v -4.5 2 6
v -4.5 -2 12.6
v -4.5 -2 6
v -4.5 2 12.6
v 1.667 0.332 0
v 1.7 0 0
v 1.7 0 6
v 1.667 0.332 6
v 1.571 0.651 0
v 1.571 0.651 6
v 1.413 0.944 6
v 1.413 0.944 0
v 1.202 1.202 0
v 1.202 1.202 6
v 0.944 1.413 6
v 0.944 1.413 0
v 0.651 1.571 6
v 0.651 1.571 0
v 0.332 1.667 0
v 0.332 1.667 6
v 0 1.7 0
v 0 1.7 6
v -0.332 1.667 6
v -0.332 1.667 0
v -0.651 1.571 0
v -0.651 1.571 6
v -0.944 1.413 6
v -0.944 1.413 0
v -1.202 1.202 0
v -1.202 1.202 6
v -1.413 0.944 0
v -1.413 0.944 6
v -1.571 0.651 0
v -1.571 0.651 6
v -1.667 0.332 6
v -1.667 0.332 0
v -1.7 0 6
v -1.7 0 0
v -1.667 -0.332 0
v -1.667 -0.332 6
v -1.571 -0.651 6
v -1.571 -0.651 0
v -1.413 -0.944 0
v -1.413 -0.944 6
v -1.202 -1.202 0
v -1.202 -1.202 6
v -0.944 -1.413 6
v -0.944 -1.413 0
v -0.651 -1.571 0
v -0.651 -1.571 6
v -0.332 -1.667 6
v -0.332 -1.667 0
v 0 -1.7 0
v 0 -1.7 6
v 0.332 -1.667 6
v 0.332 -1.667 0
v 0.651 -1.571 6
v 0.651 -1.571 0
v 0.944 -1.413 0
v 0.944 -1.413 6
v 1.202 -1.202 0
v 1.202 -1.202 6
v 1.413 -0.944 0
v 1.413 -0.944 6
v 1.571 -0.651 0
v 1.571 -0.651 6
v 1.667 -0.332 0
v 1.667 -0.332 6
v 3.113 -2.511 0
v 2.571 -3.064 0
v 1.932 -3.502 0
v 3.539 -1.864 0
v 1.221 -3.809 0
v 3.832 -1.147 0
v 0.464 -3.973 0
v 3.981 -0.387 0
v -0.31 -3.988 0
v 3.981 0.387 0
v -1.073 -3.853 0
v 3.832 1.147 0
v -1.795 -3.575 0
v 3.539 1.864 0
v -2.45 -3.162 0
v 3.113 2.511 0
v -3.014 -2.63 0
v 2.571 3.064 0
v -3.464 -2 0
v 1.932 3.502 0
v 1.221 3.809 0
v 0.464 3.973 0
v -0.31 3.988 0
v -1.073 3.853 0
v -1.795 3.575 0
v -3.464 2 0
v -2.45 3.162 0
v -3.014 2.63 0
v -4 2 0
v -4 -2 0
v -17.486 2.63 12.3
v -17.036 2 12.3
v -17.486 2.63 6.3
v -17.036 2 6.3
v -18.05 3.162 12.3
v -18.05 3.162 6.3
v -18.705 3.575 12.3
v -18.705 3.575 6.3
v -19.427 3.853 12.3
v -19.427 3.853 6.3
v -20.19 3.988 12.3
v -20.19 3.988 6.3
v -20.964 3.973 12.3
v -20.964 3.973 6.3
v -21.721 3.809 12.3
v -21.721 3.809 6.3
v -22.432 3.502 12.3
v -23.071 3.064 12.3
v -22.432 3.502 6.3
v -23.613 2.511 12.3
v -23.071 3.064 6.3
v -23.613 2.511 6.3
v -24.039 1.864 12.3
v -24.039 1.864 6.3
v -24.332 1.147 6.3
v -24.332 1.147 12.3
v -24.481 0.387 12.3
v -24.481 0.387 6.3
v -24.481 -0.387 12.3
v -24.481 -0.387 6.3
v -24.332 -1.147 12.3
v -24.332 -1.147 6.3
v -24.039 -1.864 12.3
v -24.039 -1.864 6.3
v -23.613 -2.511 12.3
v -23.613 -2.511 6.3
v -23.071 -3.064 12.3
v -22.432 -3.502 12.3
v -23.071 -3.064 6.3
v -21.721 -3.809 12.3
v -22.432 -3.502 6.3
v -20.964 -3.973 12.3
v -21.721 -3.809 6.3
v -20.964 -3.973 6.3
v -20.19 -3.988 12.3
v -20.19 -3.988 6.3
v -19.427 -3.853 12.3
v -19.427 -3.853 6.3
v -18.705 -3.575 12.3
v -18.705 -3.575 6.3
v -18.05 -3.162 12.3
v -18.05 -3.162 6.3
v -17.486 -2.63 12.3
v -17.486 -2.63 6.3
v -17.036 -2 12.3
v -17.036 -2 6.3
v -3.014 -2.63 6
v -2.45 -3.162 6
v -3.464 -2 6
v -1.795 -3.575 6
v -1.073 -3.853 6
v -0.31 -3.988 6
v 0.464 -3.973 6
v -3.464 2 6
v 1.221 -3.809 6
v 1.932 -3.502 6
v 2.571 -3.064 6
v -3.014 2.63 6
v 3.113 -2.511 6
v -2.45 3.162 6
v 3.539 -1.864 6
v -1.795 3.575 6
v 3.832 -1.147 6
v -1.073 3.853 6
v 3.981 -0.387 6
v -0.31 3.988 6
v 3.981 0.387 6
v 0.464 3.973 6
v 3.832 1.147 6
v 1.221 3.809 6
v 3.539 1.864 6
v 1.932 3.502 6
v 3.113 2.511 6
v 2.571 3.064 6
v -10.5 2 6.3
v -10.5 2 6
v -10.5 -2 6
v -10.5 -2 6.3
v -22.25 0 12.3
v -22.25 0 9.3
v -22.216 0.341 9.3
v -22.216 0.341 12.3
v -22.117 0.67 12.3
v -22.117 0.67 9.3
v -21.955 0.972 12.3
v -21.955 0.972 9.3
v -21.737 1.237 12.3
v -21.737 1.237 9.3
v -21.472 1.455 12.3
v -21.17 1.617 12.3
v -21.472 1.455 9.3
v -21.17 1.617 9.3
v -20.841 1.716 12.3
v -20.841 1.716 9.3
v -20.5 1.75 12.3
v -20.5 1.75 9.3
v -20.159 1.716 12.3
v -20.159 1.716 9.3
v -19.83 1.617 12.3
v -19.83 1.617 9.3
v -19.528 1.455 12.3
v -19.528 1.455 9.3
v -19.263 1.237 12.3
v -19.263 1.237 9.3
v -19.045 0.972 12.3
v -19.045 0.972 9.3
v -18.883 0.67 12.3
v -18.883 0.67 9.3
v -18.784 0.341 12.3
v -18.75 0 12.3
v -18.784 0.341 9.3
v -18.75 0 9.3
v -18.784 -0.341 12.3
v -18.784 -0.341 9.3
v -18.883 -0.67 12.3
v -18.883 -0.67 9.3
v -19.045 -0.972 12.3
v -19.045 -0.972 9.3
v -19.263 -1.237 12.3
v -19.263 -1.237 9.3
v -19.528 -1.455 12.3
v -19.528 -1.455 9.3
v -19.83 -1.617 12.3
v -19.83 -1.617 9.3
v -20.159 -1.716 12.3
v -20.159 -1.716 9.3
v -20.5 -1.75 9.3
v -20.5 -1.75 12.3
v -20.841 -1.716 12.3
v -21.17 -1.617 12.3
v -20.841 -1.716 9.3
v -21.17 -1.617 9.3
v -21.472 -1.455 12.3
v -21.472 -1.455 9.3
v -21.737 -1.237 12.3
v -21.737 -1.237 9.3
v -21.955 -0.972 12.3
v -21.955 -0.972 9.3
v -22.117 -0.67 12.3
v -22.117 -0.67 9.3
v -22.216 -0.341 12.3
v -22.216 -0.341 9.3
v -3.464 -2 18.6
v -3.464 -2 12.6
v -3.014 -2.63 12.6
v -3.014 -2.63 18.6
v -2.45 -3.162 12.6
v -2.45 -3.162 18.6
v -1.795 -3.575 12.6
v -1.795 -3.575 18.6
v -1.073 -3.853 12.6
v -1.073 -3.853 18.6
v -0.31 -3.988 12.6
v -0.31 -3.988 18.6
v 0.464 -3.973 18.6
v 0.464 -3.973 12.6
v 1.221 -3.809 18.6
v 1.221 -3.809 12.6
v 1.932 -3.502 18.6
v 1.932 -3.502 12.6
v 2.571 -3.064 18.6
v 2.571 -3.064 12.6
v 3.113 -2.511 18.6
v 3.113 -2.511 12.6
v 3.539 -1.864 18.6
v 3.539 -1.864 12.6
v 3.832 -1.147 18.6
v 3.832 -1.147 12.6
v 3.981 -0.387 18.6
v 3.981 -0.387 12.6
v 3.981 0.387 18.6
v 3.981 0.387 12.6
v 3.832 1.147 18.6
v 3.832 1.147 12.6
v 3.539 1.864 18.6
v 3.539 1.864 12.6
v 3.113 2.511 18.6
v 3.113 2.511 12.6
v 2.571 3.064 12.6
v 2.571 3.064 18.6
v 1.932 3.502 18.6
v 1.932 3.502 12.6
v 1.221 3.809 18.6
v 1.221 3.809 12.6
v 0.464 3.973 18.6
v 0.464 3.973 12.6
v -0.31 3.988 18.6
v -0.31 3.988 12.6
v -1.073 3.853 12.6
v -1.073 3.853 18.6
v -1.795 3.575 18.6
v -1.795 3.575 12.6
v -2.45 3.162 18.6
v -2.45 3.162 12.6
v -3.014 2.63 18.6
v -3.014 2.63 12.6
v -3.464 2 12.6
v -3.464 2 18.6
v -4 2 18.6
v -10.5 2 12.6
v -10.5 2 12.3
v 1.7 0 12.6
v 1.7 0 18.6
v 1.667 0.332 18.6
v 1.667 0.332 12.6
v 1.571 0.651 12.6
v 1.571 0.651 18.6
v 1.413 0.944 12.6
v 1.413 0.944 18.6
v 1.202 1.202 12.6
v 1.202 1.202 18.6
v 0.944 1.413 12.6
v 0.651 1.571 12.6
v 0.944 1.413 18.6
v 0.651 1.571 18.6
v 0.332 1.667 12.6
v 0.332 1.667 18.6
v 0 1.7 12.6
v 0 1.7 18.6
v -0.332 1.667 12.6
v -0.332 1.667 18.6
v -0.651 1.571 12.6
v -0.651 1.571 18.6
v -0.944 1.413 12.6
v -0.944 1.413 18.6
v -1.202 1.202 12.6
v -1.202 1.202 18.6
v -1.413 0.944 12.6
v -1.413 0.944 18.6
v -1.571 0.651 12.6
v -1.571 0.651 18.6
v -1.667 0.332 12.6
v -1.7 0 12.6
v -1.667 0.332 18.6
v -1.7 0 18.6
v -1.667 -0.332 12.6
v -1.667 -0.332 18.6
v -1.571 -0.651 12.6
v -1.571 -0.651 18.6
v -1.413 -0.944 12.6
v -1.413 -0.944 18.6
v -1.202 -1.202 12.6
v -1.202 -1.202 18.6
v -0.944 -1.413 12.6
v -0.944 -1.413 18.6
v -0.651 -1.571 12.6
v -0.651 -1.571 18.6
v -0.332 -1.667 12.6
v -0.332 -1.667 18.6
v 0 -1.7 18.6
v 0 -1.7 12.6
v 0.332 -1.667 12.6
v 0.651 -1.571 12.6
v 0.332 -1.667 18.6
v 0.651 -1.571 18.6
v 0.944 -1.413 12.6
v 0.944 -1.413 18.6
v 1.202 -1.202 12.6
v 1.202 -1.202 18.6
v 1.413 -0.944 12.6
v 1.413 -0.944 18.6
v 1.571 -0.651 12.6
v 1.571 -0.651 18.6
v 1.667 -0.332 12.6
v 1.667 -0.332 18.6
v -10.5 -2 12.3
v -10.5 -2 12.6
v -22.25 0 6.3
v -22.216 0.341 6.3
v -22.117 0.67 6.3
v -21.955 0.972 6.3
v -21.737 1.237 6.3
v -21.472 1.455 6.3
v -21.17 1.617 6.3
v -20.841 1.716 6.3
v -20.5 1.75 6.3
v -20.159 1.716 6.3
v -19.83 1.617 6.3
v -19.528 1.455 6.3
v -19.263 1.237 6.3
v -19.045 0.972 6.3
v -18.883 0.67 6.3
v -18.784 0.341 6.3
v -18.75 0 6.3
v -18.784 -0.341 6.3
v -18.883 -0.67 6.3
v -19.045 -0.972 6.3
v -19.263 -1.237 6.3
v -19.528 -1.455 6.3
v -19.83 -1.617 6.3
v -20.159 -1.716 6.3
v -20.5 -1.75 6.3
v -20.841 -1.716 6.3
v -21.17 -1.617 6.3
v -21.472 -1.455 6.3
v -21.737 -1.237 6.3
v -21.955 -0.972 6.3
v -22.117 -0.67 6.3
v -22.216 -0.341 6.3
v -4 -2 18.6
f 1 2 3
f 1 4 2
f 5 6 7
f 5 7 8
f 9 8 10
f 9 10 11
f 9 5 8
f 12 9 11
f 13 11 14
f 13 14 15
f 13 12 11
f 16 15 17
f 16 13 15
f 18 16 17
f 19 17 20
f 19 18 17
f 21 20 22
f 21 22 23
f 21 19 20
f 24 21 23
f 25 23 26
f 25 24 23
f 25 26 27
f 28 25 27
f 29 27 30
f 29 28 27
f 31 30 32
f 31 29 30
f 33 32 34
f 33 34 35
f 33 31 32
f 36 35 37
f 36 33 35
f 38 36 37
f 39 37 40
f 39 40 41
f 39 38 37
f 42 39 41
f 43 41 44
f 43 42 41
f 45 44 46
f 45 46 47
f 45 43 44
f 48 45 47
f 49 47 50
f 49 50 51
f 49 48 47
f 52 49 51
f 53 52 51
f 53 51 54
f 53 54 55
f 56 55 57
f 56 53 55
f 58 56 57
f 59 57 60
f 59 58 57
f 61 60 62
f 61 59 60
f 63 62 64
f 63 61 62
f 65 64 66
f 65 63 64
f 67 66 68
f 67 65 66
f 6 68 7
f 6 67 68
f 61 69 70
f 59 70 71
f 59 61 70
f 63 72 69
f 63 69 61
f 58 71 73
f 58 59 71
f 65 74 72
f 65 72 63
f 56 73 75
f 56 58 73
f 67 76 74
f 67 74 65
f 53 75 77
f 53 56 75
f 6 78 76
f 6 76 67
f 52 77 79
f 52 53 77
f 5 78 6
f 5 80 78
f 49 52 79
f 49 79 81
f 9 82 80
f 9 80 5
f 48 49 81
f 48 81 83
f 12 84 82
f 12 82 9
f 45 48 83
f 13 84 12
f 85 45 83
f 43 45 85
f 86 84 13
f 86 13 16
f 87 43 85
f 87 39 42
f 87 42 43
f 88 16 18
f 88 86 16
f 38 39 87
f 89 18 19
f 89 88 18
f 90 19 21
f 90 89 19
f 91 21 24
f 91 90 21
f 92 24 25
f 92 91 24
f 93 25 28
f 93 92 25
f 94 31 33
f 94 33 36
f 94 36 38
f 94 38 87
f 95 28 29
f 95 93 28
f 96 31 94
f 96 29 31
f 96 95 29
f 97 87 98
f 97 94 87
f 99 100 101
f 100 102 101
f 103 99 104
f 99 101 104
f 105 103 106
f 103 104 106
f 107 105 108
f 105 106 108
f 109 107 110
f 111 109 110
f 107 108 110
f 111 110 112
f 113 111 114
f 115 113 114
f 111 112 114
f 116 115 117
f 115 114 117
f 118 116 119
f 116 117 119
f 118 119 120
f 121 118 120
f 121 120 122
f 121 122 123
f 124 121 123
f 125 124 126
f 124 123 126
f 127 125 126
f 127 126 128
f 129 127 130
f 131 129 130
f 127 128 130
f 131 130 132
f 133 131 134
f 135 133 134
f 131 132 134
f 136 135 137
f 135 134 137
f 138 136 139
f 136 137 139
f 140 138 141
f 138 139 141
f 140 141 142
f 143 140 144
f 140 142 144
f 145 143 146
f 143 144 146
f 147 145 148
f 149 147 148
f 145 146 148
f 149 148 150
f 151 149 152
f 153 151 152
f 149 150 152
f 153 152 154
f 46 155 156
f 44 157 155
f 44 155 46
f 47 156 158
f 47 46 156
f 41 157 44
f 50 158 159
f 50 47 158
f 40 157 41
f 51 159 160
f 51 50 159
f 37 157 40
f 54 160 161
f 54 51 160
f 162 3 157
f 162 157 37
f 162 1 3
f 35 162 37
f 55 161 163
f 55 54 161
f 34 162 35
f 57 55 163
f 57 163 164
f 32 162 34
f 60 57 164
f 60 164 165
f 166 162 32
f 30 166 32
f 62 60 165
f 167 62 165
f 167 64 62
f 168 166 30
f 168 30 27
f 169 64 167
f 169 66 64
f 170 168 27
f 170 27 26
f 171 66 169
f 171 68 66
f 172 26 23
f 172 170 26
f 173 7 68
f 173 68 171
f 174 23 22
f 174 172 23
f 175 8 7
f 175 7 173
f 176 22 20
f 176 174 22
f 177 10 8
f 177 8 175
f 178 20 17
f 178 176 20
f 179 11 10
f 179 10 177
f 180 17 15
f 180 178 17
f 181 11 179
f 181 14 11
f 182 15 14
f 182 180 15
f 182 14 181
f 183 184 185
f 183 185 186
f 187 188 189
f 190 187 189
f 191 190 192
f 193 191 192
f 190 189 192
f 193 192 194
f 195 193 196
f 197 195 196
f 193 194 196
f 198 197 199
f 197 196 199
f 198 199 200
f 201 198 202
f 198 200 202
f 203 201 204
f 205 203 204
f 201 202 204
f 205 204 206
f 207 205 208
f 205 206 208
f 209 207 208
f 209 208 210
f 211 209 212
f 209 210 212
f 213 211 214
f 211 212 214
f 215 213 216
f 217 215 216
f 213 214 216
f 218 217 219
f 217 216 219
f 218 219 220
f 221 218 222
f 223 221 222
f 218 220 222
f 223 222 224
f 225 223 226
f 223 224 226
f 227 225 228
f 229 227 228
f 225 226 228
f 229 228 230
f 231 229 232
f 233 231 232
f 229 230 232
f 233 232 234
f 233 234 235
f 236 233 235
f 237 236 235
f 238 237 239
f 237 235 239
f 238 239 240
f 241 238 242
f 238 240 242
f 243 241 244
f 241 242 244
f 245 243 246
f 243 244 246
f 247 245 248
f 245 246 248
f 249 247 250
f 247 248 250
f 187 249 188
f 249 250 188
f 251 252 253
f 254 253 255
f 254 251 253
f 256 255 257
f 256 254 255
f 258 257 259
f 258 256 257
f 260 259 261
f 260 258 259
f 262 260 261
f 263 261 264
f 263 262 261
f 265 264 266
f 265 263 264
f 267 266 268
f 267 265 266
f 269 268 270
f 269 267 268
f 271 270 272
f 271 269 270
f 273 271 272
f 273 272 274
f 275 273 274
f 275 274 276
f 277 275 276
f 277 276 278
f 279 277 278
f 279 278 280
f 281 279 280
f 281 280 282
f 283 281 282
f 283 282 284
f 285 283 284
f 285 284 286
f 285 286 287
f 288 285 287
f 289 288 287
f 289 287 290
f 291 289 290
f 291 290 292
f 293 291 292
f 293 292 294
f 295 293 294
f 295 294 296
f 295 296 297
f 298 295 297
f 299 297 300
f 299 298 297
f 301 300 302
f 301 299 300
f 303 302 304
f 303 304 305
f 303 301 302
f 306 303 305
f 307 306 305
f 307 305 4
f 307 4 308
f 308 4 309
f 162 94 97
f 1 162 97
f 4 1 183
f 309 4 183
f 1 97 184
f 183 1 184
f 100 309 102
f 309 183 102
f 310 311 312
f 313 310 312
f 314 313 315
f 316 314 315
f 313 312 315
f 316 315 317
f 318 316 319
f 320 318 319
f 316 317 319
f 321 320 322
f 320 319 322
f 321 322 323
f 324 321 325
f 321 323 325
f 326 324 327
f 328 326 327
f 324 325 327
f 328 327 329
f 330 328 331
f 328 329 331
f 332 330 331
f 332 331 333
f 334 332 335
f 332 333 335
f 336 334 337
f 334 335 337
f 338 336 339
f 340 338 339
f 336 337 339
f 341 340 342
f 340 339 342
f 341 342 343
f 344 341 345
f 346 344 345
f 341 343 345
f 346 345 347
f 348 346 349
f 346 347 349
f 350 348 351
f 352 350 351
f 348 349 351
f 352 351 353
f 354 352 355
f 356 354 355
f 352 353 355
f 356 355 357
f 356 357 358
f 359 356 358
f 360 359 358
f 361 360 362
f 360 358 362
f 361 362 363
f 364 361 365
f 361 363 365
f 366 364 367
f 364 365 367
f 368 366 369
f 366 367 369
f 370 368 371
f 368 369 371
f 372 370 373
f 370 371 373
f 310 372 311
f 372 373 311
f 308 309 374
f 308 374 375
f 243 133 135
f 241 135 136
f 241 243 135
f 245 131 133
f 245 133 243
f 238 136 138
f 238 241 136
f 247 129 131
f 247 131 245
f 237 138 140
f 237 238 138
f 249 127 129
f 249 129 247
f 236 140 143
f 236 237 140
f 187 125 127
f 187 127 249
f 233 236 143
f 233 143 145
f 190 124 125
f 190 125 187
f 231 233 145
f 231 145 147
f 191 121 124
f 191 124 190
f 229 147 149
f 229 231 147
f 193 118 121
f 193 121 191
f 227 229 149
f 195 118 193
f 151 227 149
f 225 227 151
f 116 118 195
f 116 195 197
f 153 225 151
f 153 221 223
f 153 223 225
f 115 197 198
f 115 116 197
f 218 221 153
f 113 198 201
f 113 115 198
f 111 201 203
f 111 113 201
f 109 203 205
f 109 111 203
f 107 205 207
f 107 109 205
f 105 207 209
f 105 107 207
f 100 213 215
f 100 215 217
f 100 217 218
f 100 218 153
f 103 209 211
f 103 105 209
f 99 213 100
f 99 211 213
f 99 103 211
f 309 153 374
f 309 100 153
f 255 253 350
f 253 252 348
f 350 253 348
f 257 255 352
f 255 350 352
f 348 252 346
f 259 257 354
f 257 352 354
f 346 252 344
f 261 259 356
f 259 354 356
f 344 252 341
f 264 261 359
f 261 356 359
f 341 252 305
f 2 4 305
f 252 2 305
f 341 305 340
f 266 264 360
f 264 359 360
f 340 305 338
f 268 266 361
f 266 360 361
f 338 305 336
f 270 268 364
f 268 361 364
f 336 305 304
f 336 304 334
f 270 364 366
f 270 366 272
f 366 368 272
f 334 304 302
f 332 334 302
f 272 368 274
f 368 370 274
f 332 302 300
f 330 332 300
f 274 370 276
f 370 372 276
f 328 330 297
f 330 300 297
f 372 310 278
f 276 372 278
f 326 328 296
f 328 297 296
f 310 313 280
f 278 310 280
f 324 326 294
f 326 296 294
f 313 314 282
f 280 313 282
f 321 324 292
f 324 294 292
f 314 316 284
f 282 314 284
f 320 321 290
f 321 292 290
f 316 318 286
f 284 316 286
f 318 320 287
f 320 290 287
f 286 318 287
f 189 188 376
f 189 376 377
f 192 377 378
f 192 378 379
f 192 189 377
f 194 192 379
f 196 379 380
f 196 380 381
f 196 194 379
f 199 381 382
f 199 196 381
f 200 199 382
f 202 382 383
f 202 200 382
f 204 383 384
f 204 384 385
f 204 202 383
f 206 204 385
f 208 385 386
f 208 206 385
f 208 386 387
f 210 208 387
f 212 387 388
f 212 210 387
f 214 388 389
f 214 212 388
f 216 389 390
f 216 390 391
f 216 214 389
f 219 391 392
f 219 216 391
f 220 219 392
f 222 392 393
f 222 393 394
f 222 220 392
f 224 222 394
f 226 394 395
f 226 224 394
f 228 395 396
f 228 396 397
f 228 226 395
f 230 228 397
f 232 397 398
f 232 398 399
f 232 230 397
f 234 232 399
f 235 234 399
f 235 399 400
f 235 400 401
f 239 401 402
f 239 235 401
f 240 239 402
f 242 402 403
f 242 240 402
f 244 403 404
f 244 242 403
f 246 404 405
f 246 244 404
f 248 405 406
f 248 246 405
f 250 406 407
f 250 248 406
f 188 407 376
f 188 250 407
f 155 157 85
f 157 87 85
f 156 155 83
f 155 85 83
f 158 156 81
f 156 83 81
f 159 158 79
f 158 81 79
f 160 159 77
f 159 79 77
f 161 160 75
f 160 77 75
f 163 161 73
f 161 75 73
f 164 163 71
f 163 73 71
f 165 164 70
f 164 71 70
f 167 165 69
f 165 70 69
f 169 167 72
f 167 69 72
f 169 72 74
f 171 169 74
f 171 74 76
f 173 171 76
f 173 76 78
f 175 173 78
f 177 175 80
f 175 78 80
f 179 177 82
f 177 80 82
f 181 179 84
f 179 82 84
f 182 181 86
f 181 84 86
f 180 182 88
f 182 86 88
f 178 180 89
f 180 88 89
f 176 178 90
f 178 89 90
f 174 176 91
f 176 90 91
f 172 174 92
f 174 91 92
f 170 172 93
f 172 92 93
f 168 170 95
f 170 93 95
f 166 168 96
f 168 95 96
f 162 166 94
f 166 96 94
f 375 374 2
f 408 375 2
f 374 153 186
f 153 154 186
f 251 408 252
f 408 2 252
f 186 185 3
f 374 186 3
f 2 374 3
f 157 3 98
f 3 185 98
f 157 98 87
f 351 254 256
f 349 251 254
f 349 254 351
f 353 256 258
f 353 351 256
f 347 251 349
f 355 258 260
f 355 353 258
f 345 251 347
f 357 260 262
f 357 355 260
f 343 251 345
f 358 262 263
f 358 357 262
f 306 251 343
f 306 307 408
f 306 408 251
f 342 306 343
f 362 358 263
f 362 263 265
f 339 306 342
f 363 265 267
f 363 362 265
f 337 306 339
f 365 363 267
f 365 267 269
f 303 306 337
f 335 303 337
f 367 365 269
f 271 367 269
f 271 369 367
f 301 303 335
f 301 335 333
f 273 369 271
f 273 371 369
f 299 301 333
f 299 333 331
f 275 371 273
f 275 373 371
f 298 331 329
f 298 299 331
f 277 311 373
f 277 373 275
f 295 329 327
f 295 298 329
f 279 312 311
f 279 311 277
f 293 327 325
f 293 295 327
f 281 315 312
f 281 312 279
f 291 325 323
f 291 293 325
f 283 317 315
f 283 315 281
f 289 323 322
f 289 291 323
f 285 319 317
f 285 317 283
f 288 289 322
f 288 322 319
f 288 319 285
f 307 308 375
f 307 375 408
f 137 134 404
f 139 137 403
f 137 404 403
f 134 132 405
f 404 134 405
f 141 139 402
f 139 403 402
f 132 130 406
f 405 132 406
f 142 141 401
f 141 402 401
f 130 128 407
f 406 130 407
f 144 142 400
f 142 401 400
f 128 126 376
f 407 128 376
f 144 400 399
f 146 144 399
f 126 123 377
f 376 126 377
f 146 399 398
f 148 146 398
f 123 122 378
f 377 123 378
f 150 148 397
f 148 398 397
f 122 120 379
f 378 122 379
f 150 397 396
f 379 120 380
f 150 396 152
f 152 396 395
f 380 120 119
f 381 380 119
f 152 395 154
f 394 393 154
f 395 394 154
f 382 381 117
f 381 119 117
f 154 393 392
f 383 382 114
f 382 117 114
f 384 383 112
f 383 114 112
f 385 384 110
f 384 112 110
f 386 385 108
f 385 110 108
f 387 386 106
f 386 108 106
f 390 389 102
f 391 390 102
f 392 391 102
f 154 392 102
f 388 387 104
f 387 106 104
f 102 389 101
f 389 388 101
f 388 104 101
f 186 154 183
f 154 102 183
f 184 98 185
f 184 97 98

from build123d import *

# Parameters (mm, degrees)
SKETCH_1_R           = 4
SKETCH_1_R_2         = 1.7
EXTRUDE_1_DEPTH      = 6
EXTRUDE_2_DEPTH      = 2
EXTRUDE_2_DEPTH_BACK = 2
EXTRUDE_3_DEPTH      = 3
EXTRUDE_3_DEPTH_BACK = 3
SKETCH_3_R           = 1.75


with BuildPart() as part:
    # Эскиз1 → Бобышка-Вытянуть1 (new body)
    with BuildSketch(Plane.XY):
        Circle(SKETCH_1_R)
        Circle(SKETCH_1_R_2, mode=Mode.SUBTRACT)
    extrude_1 = extrude(amount=EXTRUDE_1_DEPTH)

    # Эскиз2 → Бобышка-Вытянуть2 (add, two sides: drawn at the far end of the back side and taken through both)
    with BuildSketch(Plane(origin=(0, 0, 0), x_dir=(1, 0, 0), z_dir=(0, 1, 0)).offset(-EXTRUDE_2_DEPTH_BACK)):
        Polygon((-4, 0), (-10.5, -6), (-10.5, -12.6), (-4, -18.6), (-3, -18.6), (-3, -12.6), (-4, -12.6), (-4.5, -12.6), (-4.5, -6), (-4, -6), (-3, -6), (-3, 0), align=None)
    extrude(amount=EXTRUDE_2_DEPTH + EXTRUDE_2_DEPTH_BACK)

    # Зеркальное отражение1: Бобышка-Вытянуть1 across plane
    add(extrude_1.mirror(Plane(origin=(0, 0, 9.3), x_dir=(1, 0, 0), z_dir=(0, 0, -1))))

    # Эскиз3 → Бобышка-Вытянуть3 (add, two sides: drawn at the far end of the back side and taken through both)
    with BuildSketch(Plane(origin=(0, 0, 9.3), x_dir=(-1, 0, 0), z_dir=(0, 0, -1)).offset(-EXTRUDE_3_DEPTH_BACK)):
        with BuildLine():
            Line((10.5, 2), (17.035898385, 2))
            ThreePointArc((17.035898385, 2), (24.5, 0), (17.035898385, -2))
            Line((17.035898385, -2), (10.5, -2))
            Line((10.5, -2), (10.5, 2))
        make_face()
        with Locations((20.5, 0)):
            Circle(SKETCH_3_R, mode=Mode.SUBTRACT)
    extrude(amount=EXTRUDE_3_DEPTH + EXTRUDE_3_DEPTH_BACK)


solid = part.part
